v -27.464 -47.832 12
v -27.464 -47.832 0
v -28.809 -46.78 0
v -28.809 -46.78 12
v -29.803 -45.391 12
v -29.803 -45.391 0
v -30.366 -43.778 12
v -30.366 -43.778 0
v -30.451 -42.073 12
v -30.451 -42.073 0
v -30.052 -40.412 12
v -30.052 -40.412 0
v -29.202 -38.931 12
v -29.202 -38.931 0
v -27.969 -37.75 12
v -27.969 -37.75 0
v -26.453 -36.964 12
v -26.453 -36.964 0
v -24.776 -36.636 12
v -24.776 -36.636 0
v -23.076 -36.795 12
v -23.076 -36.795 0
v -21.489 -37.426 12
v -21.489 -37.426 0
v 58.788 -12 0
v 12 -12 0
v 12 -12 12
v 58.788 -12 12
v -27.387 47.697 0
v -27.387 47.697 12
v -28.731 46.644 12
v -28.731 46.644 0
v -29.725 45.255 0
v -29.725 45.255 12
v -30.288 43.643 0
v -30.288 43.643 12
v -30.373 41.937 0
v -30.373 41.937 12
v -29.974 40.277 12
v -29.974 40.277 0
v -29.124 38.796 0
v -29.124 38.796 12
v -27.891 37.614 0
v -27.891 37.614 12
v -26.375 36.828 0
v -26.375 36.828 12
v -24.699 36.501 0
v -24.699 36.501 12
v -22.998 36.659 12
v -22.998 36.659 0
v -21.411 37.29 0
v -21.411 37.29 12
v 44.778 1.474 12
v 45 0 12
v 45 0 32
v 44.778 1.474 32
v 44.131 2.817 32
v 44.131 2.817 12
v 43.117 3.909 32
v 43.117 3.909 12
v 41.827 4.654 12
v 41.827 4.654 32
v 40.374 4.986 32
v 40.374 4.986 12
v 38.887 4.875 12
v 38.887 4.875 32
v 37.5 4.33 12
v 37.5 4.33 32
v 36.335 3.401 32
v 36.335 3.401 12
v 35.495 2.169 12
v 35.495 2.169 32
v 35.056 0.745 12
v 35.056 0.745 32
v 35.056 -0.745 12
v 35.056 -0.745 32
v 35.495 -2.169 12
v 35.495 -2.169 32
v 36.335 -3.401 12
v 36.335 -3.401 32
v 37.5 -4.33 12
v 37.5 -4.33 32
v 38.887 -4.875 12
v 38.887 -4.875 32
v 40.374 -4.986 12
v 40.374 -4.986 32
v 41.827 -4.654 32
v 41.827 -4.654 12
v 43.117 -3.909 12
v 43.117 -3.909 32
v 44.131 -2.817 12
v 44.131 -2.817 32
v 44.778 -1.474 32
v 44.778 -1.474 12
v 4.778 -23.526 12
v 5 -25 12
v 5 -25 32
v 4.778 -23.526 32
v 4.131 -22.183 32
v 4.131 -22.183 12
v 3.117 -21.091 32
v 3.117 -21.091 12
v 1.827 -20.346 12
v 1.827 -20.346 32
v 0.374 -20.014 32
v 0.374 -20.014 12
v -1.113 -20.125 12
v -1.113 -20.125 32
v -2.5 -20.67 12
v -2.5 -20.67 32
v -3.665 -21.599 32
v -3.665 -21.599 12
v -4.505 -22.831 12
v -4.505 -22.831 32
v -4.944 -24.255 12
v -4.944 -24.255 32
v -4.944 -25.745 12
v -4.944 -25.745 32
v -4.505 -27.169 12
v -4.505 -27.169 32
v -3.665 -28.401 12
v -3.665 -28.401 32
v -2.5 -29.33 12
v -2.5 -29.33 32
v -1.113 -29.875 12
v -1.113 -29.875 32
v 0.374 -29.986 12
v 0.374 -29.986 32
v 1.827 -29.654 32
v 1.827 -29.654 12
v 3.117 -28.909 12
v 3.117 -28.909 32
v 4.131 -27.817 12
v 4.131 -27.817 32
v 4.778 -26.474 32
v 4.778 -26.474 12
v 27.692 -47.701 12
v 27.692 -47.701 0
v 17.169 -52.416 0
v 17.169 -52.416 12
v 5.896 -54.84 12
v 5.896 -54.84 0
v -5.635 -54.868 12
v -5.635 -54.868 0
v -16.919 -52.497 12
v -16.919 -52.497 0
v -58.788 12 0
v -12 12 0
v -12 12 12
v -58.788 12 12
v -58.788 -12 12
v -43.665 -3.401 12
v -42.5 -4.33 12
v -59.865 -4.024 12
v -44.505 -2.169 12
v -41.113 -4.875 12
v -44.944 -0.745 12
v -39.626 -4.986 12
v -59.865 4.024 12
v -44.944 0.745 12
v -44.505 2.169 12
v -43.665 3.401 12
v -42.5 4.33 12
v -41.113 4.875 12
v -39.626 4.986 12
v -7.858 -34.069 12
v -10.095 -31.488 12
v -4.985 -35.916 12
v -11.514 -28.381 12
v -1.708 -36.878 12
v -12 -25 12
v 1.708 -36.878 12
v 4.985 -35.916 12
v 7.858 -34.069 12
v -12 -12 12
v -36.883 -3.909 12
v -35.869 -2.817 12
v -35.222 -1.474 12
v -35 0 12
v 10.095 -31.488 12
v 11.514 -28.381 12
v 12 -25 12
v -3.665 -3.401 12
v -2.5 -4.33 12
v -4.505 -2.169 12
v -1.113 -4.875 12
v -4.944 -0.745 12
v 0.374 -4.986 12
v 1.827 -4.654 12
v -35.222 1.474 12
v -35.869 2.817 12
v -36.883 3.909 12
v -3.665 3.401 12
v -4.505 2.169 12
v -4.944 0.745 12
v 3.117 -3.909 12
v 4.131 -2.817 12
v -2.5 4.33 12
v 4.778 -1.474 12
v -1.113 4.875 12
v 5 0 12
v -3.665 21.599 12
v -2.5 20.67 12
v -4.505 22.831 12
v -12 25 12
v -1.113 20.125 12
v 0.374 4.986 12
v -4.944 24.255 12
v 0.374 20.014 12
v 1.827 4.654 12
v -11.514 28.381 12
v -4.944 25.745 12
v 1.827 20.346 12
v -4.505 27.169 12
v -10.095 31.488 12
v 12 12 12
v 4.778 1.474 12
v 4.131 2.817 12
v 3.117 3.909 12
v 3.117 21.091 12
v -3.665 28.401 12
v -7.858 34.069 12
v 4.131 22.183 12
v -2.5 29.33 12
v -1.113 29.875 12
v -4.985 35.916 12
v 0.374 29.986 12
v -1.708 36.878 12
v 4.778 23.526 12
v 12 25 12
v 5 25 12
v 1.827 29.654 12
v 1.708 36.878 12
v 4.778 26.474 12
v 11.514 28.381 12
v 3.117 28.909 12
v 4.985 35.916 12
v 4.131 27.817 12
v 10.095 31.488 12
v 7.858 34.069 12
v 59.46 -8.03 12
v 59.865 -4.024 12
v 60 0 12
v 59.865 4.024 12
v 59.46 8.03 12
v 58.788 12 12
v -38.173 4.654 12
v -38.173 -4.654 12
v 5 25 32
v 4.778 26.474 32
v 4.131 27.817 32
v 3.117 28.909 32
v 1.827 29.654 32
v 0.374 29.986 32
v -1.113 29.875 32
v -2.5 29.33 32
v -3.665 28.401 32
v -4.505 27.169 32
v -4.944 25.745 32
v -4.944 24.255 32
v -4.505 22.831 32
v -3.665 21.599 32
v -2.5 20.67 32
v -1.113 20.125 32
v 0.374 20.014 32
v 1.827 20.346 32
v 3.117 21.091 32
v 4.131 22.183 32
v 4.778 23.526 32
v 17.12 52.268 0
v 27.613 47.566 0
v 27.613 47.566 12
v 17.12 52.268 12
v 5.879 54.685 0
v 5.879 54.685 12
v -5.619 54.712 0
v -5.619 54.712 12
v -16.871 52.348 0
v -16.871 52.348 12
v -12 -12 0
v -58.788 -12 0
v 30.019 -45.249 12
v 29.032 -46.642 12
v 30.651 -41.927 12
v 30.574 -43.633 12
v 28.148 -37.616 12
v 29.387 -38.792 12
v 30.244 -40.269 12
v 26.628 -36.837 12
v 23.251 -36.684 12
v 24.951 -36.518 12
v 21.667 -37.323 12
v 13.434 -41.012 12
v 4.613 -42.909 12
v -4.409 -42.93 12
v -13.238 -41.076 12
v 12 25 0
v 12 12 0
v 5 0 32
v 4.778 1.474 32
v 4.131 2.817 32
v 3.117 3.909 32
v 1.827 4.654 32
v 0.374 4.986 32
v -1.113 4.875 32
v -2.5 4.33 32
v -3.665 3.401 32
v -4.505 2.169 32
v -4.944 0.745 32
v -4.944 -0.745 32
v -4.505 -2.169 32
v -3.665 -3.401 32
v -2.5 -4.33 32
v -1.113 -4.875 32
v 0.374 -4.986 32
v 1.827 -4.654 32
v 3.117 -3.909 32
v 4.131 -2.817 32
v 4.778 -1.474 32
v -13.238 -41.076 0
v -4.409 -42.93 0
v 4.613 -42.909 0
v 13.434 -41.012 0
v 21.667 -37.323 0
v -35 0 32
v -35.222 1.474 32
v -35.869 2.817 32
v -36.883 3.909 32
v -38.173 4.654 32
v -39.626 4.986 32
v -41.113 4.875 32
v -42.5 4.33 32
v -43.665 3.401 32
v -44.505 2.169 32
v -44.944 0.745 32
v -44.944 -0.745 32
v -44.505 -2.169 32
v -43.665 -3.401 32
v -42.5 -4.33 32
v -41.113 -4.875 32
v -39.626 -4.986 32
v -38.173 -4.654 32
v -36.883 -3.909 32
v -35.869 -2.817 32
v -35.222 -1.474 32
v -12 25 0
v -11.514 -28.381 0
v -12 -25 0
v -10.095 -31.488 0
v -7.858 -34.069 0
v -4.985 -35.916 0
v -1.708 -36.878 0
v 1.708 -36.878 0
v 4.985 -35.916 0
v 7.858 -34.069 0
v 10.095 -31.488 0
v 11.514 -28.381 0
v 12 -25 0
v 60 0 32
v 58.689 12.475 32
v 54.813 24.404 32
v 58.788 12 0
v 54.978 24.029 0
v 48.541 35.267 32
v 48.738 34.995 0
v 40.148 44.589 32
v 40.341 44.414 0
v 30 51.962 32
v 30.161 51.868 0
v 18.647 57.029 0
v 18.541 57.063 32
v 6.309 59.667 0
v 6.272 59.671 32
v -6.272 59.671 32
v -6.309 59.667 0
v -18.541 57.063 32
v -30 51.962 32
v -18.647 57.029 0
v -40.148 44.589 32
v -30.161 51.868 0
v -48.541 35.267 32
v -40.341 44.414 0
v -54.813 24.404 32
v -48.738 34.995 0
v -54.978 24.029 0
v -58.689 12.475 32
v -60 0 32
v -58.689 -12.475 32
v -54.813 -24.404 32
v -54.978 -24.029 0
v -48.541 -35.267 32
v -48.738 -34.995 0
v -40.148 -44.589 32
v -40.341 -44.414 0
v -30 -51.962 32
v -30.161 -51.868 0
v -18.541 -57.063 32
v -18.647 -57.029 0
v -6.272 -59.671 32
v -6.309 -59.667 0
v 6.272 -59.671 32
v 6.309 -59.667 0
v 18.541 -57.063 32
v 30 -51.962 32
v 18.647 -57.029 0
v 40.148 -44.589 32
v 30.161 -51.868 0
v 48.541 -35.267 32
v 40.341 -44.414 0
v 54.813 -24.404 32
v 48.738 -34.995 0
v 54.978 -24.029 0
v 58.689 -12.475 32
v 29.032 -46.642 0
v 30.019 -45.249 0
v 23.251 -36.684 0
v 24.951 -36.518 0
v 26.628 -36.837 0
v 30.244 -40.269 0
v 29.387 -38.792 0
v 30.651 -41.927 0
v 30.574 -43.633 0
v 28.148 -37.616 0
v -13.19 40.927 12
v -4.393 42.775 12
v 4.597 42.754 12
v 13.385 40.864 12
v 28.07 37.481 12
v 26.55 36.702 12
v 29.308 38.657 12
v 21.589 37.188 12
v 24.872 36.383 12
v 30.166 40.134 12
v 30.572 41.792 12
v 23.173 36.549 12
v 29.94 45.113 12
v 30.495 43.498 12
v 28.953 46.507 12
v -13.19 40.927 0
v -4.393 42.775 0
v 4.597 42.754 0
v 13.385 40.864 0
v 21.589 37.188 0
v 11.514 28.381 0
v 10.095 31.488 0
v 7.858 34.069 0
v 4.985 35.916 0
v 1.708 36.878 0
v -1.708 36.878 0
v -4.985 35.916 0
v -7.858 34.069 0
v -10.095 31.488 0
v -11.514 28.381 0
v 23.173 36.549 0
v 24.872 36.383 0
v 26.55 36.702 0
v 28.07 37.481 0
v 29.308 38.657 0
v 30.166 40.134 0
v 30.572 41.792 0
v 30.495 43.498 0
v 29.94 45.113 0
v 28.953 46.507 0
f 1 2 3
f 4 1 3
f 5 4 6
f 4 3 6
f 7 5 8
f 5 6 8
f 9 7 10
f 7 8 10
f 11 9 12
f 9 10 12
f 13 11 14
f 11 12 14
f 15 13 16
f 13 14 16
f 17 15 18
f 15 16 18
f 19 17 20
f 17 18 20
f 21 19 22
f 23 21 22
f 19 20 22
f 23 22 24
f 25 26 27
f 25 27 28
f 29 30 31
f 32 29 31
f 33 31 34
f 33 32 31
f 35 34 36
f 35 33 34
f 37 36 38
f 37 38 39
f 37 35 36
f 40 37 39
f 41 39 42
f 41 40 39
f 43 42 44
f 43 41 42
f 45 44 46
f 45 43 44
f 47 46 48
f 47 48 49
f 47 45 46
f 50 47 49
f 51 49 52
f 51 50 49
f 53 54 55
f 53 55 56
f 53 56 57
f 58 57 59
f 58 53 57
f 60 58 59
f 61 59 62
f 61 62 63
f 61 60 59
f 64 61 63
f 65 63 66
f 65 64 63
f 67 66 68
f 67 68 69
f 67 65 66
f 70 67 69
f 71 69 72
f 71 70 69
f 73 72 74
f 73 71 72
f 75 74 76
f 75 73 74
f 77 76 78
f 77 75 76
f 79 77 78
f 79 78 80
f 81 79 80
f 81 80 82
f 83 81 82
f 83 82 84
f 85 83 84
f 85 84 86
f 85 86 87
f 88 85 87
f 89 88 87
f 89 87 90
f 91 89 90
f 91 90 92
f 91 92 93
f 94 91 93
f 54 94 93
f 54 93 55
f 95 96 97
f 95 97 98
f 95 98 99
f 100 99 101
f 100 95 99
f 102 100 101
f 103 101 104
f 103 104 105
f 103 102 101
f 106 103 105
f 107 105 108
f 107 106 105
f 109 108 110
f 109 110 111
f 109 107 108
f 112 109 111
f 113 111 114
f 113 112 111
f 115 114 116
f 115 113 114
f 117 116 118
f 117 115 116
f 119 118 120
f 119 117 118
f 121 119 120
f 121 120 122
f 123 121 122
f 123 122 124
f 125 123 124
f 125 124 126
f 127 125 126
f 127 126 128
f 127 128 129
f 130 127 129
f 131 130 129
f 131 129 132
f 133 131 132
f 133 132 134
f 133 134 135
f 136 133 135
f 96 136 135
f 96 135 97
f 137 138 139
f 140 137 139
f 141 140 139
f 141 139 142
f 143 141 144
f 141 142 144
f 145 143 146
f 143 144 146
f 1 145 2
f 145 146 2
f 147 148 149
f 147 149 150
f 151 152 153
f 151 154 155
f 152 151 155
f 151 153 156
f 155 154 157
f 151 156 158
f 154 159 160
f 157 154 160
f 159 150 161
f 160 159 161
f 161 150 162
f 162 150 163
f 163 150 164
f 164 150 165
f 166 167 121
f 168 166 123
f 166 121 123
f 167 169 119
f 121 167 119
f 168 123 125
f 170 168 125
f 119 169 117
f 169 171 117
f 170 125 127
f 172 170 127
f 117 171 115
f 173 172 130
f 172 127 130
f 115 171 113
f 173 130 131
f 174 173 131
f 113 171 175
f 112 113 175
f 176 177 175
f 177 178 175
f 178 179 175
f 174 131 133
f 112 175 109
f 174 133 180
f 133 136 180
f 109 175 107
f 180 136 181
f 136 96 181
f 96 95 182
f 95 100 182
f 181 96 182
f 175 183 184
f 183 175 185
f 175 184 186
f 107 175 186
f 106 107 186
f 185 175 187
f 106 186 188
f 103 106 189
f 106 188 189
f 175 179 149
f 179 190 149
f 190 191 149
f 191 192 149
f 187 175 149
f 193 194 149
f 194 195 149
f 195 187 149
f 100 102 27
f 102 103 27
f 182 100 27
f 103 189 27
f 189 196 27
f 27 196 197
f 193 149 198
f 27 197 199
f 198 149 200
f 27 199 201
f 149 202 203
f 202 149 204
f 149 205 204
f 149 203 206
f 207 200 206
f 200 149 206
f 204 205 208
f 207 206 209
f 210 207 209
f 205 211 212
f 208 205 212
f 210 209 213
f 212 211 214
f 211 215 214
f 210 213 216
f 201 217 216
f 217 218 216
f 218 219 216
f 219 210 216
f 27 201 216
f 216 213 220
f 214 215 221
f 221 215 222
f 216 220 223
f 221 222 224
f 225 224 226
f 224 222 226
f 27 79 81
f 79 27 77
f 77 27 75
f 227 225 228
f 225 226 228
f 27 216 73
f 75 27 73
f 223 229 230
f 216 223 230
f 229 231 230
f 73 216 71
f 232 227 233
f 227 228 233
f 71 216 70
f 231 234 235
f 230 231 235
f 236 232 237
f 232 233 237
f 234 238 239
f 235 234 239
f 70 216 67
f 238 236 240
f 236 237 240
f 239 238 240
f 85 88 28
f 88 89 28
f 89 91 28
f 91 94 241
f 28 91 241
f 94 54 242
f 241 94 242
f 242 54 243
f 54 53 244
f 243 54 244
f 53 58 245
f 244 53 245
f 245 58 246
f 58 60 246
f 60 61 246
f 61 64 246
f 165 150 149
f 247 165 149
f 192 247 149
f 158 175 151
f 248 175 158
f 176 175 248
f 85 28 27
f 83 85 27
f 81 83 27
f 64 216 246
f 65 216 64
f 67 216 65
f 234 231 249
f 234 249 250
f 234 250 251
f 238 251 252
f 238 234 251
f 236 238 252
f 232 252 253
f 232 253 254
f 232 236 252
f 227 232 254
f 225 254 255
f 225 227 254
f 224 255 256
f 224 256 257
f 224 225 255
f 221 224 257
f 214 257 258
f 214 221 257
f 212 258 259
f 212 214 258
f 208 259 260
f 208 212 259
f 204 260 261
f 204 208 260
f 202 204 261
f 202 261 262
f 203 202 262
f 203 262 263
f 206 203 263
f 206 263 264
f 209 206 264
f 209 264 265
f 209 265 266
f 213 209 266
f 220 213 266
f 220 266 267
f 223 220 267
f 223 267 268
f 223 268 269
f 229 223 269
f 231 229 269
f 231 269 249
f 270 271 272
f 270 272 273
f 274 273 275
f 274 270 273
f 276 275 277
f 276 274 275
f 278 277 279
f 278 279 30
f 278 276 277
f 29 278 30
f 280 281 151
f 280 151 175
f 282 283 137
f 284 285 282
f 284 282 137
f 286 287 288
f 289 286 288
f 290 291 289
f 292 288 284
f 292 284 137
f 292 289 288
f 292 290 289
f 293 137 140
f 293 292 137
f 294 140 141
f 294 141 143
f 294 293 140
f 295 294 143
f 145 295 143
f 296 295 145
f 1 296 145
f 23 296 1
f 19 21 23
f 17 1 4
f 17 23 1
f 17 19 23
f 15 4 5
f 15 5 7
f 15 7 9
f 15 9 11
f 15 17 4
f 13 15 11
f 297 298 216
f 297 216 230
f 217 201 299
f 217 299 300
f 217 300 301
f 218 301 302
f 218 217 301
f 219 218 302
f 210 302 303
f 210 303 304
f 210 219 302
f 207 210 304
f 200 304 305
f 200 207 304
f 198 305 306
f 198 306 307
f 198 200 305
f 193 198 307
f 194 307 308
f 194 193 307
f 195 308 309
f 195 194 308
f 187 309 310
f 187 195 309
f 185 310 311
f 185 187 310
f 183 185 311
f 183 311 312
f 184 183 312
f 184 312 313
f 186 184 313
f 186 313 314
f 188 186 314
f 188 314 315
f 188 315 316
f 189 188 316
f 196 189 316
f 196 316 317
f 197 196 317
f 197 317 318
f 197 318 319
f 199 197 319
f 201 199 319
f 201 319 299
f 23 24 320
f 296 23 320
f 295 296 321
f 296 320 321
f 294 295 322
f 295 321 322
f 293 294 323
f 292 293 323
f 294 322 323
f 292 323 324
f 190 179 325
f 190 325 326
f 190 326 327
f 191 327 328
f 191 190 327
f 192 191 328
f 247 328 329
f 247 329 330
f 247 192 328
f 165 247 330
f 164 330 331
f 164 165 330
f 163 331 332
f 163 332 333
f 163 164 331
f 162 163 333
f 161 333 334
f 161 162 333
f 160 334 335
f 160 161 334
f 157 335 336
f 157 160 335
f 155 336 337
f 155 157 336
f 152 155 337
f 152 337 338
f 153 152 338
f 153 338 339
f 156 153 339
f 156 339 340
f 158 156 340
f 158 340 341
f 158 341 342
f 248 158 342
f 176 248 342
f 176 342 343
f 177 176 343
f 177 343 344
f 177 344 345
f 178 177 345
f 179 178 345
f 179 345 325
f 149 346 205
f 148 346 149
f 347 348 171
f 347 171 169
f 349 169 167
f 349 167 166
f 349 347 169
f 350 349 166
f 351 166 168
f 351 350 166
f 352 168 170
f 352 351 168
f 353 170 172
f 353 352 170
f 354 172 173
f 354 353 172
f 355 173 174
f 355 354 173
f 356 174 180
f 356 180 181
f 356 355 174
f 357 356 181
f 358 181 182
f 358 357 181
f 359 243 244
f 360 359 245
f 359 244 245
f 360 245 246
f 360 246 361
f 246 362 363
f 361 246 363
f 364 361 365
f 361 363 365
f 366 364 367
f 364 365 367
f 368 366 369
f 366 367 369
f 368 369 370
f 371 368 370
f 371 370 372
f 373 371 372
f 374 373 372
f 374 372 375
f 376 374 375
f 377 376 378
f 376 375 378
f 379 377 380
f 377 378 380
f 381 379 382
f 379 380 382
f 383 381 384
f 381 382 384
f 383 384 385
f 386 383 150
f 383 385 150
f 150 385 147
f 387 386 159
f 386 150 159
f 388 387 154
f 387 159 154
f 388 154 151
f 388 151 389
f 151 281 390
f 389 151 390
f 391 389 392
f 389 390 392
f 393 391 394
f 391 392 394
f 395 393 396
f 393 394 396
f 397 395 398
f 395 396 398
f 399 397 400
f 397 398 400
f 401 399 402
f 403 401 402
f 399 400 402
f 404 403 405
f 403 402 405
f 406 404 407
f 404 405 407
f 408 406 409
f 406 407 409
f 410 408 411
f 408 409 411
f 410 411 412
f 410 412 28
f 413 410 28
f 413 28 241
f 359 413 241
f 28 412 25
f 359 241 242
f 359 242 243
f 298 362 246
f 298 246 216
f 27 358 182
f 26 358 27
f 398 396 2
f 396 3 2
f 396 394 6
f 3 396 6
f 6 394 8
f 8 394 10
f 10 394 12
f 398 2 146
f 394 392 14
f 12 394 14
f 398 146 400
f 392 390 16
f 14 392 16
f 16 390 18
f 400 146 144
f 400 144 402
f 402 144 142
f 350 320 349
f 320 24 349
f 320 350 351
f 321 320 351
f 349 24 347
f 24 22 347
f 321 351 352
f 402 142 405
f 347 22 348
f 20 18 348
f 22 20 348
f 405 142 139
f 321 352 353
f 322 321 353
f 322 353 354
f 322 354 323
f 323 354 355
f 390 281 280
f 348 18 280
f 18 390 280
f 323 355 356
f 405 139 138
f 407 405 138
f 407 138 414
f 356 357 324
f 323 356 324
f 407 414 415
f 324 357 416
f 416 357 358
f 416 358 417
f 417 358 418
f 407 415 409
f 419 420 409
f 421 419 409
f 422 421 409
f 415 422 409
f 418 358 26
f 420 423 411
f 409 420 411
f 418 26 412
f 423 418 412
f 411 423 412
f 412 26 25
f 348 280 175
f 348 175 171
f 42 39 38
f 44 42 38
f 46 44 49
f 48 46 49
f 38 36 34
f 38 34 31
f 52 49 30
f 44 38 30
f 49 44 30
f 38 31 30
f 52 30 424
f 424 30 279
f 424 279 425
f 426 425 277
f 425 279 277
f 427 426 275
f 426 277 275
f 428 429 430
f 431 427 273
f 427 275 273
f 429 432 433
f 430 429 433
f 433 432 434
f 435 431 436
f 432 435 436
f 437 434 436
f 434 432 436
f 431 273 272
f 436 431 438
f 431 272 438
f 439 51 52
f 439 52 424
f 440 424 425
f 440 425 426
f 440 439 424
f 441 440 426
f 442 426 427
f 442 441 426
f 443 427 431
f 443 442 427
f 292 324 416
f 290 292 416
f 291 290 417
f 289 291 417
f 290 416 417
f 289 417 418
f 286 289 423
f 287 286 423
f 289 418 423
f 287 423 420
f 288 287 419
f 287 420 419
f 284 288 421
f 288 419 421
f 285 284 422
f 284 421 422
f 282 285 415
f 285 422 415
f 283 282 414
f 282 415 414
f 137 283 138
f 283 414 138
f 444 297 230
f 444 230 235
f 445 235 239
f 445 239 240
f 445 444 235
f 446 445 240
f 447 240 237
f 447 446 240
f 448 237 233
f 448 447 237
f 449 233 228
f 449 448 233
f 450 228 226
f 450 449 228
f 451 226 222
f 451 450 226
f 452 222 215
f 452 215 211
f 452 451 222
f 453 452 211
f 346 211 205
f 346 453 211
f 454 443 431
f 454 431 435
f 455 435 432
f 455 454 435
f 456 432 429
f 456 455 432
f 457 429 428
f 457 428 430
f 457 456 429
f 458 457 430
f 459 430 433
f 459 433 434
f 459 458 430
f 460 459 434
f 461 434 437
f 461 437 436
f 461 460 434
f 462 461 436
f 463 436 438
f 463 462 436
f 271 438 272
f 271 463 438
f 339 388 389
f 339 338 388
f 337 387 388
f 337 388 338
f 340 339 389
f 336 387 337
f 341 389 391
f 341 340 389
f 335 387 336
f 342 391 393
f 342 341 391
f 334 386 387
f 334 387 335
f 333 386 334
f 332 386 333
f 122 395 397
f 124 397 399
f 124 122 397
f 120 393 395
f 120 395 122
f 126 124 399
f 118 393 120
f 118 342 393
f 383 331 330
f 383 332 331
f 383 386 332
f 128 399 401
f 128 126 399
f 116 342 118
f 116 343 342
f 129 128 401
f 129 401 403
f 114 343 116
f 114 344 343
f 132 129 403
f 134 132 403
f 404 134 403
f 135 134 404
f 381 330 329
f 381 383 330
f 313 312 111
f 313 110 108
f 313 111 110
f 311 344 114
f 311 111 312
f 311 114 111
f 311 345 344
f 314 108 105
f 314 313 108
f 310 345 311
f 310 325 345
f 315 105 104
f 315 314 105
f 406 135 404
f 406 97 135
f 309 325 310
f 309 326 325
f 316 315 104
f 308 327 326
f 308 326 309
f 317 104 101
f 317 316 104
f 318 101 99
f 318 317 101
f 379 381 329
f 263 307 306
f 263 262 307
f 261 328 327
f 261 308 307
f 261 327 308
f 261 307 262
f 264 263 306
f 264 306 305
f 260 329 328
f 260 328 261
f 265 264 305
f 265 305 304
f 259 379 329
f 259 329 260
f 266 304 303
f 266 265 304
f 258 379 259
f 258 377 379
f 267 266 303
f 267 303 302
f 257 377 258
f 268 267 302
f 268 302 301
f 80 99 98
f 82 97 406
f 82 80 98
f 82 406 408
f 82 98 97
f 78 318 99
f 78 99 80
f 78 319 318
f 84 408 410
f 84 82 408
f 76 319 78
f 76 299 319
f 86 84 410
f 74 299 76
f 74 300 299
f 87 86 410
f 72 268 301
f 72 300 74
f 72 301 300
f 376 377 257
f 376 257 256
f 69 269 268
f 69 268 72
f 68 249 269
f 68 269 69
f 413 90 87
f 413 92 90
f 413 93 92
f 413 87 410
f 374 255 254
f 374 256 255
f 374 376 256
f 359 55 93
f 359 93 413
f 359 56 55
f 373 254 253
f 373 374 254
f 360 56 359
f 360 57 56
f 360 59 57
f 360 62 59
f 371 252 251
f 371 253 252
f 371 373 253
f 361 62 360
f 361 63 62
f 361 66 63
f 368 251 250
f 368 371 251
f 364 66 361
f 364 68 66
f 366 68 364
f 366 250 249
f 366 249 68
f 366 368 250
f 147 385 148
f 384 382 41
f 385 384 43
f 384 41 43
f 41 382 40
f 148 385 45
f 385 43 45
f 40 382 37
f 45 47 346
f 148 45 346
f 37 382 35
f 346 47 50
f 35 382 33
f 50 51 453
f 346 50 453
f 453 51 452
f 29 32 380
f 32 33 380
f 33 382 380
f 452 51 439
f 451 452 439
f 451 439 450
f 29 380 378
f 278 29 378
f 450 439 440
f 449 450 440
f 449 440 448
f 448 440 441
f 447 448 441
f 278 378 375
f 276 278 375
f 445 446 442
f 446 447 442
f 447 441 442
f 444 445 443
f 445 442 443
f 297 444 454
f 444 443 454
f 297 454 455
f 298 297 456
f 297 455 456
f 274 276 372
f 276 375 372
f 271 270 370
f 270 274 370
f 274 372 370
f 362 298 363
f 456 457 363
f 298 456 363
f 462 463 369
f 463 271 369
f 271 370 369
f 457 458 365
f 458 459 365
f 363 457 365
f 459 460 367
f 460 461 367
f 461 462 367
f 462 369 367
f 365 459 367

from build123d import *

# Parameters (mm, degrees)
SKETCH2_R           = 60
SKETCH2_R_2         = 5
BOSS_EXTRUDE1_DEPTH = 32
SKETCH4_R           = 5
CUT_EXTRUDE2_DEPTH  = 12
CUT_EXTRUDE3_DEPTH  = 12


with BuildPart() as part:
    # Sketch2 → Boss-Extrude1 (new body)
    with BuildSketch(Plane.XY):
        Circle(SKETCH2_R)
        Circle(SKETCH2_R_2, mode=Mode.SUBTRACT)
        with Locations((40, 0)):
            Circle(SKETCH2_R_2, mode=Mode.SUBTRACT)
        with Locations((-40, 0)):
            Circle(SKETCH2_R_2, mode=Mode.SUBTRACT)
        with Locations((0, 25)):
            Circle(SKETCH2_R_2, mode=Mode.SUBTRACT)
        with Locations((0, -25)):
            Circle(SKETCH2_R_2, mode=Mode.SUBTRACT)
    extrude(amount=BOSS_EXTRUDE1_DEPTH)

    # Sketch4 → Cut-Extrude2 (cut)
    with BuildSketch(Plane.XY):
        with BuildLine():
            Line((12, 12), (12, 25))
            ThreePointArc((12, 25), (0, 37), (-12, 25))
            Line((-12, 25), (-12, 12))
            Line((-12, 12), (-58.787753827, 12))
            ThreePointArc((-58.787753827, 12), (-60, 0), (-58.787753827, -12))
            Line((-58.787753827, -12), (-12, -12))
            Line((-12, -12), (-12, -25))
            ThreePointArc((-12, -25), (0, -37), (12, -25))
            Line((12, -25), (12, -12))
            Line((12, -12), (58.787753827, -12))
            ThreePointArc((58.787753827, -12), (59.69616918, -6.03053772), (60, 0))
            ThreePointArc((60, 0), (59.69616918, 6.03053772), (58.787753827, 12))
            Line((58.787753827, 12), (12, 12))
        make_face()
        with Locations((-40, 0)):
            Circle(SKETCH4_R, mode=Mode.SUBTRACT)
        with Locations((0, -25)):
            Circle(SKETCH4_R, mode=Mode.SUBTRACT)
        Circle(SKETCH4_R, mode=Mode.SUBTRACT)
        with Locations((40, 0)):
            Circle(SKETCH4_R, mode=Mode.SUBTRACT)
        with Locations((0, 25)):
            Circle(SKETCH4_R, mode=Mode.SUBTRACT)
    extrude(amount=CUT_EXTRUDE2_DEPTH, mode=Mode.SUBTRACT)

    # Sketch5 → Cut-Extrude3 (cut)
    with BuildSketch(Plane.XY):
        with BuildLine():
            ThreePointArc((27.613309165, 47.565798185), (0.130928127, 54.999844162), (-27.386534997, 47.696726312))
            ThreePointArc((-27.386534997, 47.696726312), (-29.602192231, 39.505825078), (-21.411290998, 37.290167844))
            ThreePointArc((-21.411290998, 37.290167844), (0.10236199, 42.999878163), (21.588587165, 37.187805854))
            ThreePointArc((21.588587165, 37.187805854), (29.789944331, 39.364441019), (27.613309165, 47.565798185))
        make_face()
        with BuildLine():
            ThreePointArc((-27.464289902, -47.832145212), (-29.679947137, -39.641243979), (-21.489045903, -37.425586744))
            ThreePointArc((-21.489045903, -37.425586744), (0.102733717, -43.156031824), (21.66698592, -37.322853027))
            ThreePointArc((21.66698592, -37.322853027), (29.868343086, -39.499488193), (27.69170792, -47.700845359))
            ThreePointArc((27.69170792, -47.700845359), (0.131299854, -55.155997823), (-27.464289902, -47.832145212))
        make_face()
    extrude(amount=CUT_EXTRUDE3_DEPTH, mode=Mode.SUBTRACT)


solid = part.part
